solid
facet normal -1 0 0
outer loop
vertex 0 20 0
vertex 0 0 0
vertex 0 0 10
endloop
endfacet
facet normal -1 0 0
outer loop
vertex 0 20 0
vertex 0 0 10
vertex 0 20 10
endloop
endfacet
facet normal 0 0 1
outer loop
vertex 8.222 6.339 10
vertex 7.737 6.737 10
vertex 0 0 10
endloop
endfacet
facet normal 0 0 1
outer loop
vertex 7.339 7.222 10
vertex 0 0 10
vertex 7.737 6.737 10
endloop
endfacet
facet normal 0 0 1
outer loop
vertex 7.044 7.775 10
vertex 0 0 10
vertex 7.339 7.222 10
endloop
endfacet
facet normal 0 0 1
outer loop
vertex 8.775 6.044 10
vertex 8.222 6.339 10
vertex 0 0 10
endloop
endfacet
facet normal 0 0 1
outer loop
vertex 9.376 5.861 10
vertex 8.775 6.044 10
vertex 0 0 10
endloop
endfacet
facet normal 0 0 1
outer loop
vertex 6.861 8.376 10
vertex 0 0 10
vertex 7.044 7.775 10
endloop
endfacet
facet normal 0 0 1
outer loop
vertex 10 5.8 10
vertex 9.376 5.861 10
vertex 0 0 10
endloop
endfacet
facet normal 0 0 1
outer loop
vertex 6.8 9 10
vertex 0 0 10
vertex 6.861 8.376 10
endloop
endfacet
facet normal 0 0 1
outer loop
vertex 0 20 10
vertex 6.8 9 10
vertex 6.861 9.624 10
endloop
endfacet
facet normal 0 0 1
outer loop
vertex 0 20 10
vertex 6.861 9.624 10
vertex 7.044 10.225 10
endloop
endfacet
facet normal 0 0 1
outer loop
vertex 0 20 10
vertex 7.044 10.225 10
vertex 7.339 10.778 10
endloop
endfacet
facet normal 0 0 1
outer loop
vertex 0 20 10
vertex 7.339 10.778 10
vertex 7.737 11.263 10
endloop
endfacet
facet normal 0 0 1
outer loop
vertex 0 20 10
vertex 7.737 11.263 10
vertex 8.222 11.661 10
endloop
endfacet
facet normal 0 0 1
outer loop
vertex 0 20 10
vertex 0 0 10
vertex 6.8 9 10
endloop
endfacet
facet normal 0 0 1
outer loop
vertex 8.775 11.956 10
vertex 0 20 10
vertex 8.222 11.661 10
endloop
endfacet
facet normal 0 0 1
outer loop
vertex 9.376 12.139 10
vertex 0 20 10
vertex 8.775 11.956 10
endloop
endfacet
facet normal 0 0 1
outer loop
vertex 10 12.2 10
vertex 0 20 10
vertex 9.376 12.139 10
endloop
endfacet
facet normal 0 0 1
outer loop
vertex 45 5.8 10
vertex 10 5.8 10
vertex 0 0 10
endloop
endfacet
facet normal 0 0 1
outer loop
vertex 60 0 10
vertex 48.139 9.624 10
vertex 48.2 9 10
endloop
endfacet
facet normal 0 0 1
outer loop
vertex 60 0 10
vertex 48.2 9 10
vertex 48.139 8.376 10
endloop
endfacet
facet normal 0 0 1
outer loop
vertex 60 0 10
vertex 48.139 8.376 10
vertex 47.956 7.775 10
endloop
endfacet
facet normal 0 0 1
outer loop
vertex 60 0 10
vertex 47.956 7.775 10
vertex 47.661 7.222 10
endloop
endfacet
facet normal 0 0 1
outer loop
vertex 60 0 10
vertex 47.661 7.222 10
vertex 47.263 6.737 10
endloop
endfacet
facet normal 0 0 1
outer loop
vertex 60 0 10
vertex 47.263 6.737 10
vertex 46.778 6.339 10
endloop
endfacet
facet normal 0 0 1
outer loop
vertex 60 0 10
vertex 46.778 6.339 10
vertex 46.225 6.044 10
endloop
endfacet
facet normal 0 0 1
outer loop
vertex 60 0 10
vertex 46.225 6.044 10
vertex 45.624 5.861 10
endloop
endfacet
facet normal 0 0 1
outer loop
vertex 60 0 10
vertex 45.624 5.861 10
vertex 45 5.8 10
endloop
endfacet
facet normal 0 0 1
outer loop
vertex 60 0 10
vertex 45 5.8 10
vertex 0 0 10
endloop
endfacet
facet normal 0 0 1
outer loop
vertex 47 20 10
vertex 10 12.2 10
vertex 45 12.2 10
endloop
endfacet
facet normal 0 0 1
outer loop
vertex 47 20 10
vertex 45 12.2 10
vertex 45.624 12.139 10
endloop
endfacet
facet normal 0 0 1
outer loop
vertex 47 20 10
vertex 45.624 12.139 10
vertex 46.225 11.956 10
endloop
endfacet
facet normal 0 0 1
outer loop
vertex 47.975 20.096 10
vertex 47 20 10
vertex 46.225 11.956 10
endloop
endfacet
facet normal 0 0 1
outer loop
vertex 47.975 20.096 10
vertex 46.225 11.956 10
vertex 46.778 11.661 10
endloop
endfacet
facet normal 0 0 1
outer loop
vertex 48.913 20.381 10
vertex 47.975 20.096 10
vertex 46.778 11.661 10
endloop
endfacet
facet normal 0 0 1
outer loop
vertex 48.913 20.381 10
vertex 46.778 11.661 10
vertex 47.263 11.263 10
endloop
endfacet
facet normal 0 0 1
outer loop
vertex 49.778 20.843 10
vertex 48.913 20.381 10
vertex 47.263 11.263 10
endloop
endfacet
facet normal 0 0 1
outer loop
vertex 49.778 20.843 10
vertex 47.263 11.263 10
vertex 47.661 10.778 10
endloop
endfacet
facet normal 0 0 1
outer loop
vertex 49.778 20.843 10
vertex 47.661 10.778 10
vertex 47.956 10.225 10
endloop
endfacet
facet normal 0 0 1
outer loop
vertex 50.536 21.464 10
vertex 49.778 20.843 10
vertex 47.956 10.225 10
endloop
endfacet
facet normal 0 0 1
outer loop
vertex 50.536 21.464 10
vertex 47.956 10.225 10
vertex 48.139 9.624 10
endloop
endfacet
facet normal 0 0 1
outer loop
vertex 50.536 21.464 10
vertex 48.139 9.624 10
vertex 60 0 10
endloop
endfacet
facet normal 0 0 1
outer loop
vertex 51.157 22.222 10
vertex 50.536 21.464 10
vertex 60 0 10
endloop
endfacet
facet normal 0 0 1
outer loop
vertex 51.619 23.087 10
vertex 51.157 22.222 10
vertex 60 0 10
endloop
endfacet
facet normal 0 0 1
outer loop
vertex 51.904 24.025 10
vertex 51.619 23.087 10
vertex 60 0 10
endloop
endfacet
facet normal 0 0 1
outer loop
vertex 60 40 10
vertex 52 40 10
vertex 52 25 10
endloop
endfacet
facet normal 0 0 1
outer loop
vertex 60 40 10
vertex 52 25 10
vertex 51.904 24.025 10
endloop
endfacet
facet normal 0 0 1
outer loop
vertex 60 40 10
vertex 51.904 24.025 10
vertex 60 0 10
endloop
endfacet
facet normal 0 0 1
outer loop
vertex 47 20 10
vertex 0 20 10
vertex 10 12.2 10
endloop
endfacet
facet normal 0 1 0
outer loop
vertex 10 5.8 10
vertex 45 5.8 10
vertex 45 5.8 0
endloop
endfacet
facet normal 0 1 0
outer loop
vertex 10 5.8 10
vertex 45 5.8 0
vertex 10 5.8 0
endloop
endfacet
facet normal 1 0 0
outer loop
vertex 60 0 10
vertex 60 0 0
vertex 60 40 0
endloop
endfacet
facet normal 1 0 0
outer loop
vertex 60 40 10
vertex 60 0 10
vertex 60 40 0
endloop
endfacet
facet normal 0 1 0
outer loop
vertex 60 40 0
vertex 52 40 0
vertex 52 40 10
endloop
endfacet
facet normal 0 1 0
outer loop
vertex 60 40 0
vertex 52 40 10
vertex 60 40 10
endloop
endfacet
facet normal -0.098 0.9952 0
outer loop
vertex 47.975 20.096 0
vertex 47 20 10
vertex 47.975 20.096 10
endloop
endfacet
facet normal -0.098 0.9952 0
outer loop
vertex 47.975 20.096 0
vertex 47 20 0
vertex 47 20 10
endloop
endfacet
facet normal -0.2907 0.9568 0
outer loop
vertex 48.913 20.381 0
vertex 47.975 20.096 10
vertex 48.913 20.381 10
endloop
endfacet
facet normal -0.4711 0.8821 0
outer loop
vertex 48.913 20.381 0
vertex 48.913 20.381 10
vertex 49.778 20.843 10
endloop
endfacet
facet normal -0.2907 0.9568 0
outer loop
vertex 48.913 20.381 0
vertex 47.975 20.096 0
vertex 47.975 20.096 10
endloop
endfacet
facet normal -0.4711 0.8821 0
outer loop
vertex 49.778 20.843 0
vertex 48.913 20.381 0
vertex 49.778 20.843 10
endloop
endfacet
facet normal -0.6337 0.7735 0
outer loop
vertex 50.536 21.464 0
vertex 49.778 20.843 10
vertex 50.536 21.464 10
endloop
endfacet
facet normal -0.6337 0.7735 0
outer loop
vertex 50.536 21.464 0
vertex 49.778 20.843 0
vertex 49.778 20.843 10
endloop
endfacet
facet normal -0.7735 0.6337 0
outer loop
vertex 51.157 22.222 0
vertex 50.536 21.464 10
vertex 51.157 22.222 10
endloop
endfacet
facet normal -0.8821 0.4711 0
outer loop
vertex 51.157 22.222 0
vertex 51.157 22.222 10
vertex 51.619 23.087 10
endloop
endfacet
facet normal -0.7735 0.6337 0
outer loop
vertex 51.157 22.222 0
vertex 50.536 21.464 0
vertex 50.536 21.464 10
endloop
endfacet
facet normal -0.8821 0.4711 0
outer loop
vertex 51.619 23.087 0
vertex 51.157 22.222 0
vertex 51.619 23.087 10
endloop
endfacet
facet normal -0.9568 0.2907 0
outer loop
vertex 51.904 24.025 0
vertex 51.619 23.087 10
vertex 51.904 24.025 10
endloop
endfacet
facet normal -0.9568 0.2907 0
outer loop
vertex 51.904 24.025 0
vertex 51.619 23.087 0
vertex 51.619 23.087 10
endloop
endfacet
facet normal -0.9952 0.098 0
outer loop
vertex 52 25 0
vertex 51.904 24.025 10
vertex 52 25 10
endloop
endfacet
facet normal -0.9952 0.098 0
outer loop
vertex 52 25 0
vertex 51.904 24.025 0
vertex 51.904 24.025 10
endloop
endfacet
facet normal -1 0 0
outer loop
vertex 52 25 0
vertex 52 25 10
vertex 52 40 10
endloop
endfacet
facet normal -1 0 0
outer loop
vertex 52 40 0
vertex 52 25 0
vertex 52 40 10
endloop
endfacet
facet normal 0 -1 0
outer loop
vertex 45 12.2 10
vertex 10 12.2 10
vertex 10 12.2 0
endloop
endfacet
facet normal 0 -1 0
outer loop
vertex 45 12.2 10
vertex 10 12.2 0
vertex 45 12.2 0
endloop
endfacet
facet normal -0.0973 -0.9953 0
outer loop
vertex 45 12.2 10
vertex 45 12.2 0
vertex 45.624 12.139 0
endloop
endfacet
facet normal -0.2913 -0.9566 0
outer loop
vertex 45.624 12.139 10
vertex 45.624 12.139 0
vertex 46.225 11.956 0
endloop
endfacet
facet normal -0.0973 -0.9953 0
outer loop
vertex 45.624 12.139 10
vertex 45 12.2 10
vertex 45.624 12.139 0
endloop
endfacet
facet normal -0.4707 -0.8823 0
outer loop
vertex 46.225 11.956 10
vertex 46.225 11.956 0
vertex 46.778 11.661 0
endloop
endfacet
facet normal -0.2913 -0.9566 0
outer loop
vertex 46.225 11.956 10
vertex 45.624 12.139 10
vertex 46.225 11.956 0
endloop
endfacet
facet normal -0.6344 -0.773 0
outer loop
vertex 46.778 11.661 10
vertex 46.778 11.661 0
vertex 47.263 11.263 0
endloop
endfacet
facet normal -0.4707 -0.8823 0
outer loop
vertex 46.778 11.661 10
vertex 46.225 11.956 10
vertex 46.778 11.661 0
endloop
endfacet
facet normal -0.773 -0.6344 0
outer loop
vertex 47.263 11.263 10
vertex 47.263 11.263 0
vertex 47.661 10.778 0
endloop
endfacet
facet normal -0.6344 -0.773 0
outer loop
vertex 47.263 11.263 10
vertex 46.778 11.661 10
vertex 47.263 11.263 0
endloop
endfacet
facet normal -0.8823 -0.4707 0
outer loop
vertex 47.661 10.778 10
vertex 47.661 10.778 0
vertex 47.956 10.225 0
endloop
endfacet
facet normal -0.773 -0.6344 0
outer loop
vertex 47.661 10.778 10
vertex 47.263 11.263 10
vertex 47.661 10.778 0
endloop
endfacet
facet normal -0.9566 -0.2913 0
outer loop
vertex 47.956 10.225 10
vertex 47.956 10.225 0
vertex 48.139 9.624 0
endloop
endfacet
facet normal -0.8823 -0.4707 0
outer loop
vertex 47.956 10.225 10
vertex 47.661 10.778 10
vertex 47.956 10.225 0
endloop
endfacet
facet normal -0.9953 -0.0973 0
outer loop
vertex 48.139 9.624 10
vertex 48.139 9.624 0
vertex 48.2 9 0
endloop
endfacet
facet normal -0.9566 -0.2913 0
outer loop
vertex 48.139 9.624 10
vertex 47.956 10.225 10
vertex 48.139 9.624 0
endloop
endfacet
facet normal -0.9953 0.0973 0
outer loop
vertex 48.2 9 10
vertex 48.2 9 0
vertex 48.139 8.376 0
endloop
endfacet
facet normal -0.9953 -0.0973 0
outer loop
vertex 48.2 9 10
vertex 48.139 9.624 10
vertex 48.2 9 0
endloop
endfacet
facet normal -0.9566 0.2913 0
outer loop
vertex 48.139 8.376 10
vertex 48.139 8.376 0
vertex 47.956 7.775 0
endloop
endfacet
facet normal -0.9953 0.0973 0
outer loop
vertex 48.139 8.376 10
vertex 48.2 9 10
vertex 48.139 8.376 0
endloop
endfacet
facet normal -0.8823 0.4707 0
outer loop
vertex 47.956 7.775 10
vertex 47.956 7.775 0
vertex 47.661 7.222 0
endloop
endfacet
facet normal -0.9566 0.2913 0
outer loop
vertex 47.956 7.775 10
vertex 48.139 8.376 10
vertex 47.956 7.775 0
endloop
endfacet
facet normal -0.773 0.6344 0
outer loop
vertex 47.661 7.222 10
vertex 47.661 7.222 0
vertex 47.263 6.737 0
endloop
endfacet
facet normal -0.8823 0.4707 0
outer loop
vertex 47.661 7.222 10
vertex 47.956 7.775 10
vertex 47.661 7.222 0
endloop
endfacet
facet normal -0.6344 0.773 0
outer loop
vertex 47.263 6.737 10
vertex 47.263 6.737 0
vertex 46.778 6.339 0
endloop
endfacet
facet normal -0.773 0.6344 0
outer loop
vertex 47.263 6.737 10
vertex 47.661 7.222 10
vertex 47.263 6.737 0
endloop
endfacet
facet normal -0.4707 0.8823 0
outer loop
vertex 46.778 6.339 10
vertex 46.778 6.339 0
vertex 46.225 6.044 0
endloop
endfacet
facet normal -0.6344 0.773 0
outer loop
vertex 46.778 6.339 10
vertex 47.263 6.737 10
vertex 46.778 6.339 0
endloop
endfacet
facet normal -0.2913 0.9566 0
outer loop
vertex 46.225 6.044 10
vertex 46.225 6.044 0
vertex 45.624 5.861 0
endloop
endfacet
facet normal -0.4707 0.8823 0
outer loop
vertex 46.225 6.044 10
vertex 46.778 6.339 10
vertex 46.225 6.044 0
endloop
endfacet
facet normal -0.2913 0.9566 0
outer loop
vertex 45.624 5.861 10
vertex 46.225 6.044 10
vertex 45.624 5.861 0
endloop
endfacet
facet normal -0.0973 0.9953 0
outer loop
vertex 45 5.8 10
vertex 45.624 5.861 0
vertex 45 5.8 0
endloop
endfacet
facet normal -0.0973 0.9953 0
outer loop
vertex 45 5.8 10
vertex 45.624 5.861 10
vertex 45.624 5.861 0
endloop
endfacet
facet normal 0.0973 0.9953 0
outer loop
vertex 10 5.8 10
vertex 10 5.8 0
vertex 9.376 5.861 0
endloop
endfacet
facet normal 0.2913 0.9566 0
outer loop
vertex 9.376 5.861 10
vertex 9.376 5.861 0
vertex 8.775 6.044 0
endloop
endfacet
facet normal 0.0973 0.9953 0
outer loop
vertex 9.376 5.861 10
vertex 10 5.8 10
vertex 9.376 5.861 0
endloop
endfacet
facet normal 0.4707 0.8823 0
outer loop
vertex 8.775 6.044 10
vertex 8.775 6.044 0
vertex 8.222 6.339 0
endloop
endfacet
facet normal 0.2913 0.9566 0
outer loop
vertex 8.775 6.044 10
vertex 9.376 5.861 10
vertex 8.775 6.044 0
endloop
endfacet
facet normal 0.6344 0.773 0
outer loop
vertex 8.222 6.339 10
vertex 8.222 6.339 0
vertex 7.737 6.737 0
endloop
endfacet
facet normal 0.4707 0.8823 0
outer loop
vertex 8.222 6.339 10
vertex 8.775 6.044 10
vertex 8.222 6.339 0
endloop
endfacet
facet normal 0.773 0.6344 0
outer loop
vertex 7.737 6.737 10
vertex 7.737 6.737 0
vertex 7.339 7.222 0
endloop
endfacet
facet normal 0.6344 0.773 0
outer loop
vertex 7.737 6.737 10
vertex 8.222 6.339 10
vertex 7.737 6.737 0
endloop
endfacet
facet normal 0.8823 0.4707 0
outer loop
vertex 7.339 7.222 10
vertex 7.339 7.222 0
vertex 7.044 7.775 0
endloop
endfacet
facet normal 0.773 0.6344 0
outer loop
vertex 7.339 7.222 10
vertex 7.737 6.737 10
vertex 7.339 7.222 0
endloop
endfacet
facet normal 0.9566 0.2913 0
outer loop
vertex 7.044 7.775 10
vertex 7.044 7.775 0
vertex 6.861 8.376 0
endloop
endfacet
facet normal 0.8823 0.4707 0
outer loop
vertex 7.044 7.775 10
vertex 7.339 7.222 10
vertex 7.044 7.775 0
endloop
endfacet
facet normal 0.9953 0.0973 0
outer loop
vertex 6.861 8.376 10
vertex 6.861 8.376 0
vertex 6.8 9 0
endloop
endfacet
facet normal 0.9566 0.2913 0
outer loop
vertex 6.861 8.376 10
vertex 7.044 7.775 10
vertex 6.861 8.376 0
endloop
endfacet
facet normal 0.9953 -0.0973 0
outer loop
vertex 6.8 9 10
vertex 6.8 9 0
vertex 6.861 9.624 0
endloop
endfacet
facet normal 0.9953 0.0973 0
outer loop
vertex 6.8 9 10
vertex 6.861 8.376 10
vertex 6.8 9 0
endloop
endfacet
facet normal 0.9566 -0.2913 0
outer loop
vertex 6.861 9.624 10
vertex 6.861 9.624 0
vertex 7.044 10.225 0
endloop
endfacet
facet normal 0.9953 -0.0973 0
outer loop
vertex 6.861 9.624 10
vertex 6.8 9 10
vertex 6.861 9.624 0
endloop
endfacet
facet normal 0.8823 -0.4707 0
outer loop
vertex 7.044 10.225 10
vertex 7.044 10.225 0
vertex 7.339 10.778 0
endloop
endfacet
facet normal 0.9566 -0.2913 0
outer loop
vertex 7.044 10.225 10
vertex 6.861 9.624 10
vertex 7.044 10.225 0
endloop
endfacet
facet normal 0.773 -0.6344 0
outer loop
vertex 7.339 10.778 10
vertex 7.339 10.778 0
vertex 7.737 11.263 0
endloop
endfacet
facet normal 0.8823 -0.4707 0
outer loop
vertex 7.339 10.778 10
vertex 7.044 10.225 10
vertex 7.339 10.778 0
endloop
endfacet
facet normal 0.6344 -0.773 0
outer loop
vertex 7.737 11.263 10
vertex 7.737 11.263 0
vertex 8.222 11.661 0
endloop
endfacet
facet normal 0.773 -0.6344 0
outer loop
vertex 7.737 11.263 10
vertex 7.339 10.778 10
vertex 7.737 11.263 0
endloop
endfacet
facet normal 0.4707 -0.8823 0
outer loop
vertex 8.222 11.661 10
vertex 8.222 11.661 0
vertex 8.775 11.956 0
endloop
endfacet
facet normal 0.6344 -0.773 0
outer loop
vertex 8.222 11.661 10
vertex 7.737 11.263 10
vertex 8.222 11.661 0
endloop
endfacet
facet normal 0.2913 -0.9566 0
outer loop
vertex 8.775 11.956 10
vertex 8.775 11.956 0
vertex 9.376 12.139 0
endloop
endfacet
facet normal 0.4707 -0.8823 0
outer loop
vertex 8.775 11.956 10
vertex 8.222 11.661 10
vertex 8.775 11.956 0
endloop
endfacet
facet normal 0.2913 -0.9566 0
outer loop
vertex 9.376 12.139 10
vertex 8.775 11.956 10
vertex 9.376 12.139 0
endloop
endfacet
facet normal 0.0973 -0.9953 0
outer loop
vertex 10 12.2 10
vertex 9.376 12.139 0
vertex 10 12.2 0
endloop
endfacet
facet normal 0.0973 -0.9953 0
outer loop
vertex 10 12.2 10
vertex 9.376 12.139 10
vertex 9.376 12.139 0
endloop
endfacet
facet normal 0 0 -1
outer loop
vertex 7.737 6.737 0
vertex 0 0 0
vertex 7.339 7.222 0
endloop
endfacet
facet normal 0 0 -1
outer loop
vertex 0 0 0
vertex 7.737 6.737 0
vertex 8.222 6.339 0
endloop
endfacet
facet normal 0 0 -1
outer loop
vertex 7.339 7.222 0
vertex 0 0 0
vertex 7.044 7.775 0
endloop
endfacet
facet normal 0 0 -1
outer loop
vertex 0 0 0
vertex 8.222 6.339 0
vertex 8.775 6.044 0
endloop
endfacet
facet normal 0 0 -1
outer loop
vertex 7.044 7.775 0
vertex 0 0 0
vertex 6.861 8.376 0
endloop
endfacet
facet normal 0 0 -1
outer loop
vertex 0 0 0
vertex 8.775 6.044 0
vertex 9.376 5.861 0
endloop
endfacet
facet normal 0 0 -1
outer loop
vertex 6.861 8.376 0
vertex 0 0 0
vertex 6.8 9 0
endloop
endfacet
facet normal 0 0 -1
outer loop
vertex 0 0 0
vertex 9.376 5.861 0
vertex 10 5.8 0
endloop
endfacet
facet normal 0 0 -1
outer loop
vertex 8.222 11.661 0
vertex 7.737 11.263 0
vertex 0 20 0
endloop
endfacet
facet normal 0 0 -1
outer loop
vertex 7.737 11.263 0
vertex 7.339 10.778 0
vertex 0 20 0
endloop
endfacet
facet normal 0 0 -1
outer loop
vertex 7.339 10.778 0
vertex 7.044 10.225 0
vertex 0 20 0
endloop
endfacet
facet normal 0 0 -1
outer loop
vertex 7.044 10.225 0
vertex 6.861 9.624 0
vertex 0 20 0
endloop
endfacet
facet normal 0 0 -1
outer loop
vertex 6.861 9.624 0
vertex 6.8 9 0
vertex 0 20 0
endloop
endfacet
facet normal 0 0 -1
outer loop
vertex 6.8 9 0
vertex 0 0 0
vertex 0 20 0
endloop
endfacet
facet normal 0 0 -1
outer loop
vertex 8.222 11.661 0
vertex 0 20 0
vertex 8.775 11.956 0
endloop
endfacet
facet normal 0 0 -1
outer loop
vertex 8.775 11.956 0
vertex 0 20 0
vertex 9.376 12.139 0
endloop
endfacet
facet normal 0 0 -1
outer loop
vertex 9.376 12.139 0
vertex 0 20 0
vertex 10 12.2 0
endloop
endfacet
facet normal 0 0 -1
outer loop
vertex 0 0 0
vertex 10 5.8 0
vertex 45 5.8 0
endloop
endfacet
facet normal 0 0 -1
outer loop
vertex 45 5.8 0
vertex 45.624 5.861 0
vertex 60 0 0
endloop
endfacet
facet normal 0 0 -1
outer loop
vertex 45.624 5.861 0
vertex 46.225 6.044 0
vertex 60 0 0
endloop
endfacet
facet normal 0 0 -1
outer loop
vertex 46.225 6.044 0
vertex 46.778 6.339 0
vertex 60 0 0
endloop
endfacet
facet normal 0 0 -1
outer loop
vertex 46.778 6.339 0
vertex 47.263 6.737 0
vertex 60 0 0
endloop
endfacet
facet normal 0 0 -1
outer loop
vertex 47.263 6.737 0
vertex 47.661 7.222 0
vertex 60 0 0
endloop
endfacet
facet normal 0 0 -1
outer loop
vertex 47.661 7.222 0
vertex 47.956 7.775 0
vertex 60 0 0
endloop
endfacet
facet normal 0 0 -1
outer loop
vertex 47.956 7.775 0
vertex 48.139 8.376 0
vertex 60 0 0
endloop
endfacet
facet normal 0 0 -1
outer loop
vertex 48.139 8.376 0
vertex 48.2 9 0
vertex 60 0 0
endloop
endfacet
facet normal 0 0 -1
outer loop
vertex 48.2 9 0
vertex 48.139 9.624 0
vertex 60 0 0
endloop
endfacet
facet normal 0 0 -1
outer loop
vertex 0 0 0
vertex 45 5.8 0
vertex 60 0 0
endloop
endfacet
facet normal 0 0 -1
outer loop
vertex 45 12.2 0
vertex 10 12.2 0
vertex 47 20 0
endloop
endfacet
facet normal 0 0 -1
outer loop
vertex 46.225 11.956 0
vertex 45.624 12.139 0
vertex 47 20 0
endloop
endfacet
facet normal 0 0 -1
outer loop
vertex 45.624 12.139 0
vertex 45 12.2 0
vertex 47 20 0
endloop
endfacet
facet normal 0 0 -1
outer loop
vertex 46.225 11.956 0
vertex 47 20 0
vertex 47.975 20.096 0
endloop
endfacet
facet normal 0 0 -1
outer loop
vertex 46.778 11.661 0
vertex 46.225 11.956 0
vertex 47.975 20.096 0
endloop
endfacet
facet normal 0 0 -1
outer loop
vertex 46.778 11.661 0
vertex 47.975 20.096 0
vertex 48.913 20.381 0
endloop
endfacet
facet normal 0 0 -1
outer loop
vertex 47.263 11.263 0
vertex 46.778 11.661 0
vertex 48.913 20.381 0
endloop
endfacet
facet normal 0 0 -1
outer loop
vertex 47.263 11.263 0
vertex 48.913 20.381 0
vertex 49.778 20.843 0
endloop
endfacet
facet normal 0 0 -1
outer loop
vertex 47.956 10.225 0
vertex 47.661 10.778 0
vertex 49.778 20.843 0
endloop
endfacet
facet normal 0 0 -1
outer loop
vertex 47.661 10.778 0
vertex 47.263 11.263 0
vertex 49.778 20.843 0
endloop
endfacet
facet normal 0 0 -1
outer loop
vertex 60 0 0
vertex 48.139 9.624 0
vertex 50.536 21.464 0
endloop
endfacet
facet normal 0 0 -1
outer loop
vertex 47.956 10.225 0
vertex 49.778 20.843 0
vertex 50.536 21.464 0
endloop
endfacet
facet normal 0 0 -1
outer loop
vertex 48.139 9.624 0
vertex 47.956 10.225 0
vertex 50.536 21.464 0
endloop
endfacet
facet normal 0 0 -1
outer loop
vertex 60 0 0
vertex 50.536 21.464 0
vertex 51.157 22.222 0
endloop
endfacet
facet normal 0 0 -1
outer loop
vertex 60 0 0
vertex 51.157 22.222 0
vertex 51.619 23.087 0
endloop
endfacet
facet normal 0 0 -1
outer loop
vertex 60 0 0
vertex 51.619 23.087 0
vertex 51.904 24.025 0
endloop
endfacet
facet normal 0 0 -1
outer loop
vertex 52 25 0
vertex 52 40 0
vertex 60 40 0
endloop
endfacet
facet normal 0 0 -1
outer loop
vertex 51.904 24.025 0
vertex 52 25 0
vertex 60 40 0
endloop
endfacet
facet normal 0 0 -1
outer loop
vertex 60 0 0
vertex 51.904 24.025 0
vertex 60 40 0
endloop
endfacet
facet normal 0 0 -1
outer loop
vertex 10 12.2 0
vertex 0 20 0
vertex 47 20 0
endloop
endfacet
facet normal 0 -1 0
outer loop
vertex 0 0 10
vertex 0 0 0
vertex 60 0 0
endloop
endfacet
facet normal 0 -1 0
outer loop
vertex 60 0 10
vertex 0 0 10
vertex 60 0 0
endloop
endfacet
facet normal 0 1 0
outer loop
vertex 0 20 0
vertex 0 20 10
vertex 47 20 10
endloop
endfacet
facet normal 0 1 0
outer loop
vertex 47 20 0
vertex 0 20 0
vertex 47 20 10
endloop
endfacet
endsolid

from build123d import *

# Parameters (mm, degrees)
SKETCH_1_W          = 60
SKETCH_1_H          = 40
EXTRUDE_1_DEPTH     = 10
SKETCH_2_W          = 52
SKETCH_2_H          = 20
CUT_EXTRUDE_1_DEPTH = 73.801098893
FILLET_1_R          = 5
CUT_EXTRUDE_2_DEPTH = 73.801098893


with BuildPart() as part:
    # 草图1 → 凸台-拉伸1 (new body)
    with BuildSketch(Plane.XY):
        with Locations((30, 20)):
            Rectangle(SKETCH_1_W, SKETCH_1_H)
    extrude(amount=EXTRUDE_1_DEPTH)

    # 草图2 → 切除-拉伸1 (cut, through all)
    with BuildSketch(Plane.XY.offset(10)):
        with Locations((26, 30)):
            Rectangle(SKETCH_2_W, SKETCH_2_H)
    extrude(amount=-CUT_EXTRUDE_1_DEPTH, mode=Mode.SUBTRACT)

    # 圆角1
    fillet_1_edges = [part.edges().sort_by_distance(p)[0] for p in [
        (52, 20, 5),
    ]]
    fillet(fillet_1_edges, radius=FILLET_1_R)

    # 草图3 → 切除-拉伸2 (cut, through all)
    with BuildSketch(Plane.XY.offset(10)):
        with BuildLine():
            Line((10, 12.2), (45, 12.2))
            ThreePointArc((45, 12.2), (48.2, 9), (45, 5.8))
            Line((45, 5.8), (10, 5.8))
            ThreePointArc((10, 5.8), (6.8, 9), (10, 12.2))
        make_face()
    extrude(amount=-CUT_EXTRUDE_2_DEPTH, mode=Mode.SUBTRACT)


solid = part.part
